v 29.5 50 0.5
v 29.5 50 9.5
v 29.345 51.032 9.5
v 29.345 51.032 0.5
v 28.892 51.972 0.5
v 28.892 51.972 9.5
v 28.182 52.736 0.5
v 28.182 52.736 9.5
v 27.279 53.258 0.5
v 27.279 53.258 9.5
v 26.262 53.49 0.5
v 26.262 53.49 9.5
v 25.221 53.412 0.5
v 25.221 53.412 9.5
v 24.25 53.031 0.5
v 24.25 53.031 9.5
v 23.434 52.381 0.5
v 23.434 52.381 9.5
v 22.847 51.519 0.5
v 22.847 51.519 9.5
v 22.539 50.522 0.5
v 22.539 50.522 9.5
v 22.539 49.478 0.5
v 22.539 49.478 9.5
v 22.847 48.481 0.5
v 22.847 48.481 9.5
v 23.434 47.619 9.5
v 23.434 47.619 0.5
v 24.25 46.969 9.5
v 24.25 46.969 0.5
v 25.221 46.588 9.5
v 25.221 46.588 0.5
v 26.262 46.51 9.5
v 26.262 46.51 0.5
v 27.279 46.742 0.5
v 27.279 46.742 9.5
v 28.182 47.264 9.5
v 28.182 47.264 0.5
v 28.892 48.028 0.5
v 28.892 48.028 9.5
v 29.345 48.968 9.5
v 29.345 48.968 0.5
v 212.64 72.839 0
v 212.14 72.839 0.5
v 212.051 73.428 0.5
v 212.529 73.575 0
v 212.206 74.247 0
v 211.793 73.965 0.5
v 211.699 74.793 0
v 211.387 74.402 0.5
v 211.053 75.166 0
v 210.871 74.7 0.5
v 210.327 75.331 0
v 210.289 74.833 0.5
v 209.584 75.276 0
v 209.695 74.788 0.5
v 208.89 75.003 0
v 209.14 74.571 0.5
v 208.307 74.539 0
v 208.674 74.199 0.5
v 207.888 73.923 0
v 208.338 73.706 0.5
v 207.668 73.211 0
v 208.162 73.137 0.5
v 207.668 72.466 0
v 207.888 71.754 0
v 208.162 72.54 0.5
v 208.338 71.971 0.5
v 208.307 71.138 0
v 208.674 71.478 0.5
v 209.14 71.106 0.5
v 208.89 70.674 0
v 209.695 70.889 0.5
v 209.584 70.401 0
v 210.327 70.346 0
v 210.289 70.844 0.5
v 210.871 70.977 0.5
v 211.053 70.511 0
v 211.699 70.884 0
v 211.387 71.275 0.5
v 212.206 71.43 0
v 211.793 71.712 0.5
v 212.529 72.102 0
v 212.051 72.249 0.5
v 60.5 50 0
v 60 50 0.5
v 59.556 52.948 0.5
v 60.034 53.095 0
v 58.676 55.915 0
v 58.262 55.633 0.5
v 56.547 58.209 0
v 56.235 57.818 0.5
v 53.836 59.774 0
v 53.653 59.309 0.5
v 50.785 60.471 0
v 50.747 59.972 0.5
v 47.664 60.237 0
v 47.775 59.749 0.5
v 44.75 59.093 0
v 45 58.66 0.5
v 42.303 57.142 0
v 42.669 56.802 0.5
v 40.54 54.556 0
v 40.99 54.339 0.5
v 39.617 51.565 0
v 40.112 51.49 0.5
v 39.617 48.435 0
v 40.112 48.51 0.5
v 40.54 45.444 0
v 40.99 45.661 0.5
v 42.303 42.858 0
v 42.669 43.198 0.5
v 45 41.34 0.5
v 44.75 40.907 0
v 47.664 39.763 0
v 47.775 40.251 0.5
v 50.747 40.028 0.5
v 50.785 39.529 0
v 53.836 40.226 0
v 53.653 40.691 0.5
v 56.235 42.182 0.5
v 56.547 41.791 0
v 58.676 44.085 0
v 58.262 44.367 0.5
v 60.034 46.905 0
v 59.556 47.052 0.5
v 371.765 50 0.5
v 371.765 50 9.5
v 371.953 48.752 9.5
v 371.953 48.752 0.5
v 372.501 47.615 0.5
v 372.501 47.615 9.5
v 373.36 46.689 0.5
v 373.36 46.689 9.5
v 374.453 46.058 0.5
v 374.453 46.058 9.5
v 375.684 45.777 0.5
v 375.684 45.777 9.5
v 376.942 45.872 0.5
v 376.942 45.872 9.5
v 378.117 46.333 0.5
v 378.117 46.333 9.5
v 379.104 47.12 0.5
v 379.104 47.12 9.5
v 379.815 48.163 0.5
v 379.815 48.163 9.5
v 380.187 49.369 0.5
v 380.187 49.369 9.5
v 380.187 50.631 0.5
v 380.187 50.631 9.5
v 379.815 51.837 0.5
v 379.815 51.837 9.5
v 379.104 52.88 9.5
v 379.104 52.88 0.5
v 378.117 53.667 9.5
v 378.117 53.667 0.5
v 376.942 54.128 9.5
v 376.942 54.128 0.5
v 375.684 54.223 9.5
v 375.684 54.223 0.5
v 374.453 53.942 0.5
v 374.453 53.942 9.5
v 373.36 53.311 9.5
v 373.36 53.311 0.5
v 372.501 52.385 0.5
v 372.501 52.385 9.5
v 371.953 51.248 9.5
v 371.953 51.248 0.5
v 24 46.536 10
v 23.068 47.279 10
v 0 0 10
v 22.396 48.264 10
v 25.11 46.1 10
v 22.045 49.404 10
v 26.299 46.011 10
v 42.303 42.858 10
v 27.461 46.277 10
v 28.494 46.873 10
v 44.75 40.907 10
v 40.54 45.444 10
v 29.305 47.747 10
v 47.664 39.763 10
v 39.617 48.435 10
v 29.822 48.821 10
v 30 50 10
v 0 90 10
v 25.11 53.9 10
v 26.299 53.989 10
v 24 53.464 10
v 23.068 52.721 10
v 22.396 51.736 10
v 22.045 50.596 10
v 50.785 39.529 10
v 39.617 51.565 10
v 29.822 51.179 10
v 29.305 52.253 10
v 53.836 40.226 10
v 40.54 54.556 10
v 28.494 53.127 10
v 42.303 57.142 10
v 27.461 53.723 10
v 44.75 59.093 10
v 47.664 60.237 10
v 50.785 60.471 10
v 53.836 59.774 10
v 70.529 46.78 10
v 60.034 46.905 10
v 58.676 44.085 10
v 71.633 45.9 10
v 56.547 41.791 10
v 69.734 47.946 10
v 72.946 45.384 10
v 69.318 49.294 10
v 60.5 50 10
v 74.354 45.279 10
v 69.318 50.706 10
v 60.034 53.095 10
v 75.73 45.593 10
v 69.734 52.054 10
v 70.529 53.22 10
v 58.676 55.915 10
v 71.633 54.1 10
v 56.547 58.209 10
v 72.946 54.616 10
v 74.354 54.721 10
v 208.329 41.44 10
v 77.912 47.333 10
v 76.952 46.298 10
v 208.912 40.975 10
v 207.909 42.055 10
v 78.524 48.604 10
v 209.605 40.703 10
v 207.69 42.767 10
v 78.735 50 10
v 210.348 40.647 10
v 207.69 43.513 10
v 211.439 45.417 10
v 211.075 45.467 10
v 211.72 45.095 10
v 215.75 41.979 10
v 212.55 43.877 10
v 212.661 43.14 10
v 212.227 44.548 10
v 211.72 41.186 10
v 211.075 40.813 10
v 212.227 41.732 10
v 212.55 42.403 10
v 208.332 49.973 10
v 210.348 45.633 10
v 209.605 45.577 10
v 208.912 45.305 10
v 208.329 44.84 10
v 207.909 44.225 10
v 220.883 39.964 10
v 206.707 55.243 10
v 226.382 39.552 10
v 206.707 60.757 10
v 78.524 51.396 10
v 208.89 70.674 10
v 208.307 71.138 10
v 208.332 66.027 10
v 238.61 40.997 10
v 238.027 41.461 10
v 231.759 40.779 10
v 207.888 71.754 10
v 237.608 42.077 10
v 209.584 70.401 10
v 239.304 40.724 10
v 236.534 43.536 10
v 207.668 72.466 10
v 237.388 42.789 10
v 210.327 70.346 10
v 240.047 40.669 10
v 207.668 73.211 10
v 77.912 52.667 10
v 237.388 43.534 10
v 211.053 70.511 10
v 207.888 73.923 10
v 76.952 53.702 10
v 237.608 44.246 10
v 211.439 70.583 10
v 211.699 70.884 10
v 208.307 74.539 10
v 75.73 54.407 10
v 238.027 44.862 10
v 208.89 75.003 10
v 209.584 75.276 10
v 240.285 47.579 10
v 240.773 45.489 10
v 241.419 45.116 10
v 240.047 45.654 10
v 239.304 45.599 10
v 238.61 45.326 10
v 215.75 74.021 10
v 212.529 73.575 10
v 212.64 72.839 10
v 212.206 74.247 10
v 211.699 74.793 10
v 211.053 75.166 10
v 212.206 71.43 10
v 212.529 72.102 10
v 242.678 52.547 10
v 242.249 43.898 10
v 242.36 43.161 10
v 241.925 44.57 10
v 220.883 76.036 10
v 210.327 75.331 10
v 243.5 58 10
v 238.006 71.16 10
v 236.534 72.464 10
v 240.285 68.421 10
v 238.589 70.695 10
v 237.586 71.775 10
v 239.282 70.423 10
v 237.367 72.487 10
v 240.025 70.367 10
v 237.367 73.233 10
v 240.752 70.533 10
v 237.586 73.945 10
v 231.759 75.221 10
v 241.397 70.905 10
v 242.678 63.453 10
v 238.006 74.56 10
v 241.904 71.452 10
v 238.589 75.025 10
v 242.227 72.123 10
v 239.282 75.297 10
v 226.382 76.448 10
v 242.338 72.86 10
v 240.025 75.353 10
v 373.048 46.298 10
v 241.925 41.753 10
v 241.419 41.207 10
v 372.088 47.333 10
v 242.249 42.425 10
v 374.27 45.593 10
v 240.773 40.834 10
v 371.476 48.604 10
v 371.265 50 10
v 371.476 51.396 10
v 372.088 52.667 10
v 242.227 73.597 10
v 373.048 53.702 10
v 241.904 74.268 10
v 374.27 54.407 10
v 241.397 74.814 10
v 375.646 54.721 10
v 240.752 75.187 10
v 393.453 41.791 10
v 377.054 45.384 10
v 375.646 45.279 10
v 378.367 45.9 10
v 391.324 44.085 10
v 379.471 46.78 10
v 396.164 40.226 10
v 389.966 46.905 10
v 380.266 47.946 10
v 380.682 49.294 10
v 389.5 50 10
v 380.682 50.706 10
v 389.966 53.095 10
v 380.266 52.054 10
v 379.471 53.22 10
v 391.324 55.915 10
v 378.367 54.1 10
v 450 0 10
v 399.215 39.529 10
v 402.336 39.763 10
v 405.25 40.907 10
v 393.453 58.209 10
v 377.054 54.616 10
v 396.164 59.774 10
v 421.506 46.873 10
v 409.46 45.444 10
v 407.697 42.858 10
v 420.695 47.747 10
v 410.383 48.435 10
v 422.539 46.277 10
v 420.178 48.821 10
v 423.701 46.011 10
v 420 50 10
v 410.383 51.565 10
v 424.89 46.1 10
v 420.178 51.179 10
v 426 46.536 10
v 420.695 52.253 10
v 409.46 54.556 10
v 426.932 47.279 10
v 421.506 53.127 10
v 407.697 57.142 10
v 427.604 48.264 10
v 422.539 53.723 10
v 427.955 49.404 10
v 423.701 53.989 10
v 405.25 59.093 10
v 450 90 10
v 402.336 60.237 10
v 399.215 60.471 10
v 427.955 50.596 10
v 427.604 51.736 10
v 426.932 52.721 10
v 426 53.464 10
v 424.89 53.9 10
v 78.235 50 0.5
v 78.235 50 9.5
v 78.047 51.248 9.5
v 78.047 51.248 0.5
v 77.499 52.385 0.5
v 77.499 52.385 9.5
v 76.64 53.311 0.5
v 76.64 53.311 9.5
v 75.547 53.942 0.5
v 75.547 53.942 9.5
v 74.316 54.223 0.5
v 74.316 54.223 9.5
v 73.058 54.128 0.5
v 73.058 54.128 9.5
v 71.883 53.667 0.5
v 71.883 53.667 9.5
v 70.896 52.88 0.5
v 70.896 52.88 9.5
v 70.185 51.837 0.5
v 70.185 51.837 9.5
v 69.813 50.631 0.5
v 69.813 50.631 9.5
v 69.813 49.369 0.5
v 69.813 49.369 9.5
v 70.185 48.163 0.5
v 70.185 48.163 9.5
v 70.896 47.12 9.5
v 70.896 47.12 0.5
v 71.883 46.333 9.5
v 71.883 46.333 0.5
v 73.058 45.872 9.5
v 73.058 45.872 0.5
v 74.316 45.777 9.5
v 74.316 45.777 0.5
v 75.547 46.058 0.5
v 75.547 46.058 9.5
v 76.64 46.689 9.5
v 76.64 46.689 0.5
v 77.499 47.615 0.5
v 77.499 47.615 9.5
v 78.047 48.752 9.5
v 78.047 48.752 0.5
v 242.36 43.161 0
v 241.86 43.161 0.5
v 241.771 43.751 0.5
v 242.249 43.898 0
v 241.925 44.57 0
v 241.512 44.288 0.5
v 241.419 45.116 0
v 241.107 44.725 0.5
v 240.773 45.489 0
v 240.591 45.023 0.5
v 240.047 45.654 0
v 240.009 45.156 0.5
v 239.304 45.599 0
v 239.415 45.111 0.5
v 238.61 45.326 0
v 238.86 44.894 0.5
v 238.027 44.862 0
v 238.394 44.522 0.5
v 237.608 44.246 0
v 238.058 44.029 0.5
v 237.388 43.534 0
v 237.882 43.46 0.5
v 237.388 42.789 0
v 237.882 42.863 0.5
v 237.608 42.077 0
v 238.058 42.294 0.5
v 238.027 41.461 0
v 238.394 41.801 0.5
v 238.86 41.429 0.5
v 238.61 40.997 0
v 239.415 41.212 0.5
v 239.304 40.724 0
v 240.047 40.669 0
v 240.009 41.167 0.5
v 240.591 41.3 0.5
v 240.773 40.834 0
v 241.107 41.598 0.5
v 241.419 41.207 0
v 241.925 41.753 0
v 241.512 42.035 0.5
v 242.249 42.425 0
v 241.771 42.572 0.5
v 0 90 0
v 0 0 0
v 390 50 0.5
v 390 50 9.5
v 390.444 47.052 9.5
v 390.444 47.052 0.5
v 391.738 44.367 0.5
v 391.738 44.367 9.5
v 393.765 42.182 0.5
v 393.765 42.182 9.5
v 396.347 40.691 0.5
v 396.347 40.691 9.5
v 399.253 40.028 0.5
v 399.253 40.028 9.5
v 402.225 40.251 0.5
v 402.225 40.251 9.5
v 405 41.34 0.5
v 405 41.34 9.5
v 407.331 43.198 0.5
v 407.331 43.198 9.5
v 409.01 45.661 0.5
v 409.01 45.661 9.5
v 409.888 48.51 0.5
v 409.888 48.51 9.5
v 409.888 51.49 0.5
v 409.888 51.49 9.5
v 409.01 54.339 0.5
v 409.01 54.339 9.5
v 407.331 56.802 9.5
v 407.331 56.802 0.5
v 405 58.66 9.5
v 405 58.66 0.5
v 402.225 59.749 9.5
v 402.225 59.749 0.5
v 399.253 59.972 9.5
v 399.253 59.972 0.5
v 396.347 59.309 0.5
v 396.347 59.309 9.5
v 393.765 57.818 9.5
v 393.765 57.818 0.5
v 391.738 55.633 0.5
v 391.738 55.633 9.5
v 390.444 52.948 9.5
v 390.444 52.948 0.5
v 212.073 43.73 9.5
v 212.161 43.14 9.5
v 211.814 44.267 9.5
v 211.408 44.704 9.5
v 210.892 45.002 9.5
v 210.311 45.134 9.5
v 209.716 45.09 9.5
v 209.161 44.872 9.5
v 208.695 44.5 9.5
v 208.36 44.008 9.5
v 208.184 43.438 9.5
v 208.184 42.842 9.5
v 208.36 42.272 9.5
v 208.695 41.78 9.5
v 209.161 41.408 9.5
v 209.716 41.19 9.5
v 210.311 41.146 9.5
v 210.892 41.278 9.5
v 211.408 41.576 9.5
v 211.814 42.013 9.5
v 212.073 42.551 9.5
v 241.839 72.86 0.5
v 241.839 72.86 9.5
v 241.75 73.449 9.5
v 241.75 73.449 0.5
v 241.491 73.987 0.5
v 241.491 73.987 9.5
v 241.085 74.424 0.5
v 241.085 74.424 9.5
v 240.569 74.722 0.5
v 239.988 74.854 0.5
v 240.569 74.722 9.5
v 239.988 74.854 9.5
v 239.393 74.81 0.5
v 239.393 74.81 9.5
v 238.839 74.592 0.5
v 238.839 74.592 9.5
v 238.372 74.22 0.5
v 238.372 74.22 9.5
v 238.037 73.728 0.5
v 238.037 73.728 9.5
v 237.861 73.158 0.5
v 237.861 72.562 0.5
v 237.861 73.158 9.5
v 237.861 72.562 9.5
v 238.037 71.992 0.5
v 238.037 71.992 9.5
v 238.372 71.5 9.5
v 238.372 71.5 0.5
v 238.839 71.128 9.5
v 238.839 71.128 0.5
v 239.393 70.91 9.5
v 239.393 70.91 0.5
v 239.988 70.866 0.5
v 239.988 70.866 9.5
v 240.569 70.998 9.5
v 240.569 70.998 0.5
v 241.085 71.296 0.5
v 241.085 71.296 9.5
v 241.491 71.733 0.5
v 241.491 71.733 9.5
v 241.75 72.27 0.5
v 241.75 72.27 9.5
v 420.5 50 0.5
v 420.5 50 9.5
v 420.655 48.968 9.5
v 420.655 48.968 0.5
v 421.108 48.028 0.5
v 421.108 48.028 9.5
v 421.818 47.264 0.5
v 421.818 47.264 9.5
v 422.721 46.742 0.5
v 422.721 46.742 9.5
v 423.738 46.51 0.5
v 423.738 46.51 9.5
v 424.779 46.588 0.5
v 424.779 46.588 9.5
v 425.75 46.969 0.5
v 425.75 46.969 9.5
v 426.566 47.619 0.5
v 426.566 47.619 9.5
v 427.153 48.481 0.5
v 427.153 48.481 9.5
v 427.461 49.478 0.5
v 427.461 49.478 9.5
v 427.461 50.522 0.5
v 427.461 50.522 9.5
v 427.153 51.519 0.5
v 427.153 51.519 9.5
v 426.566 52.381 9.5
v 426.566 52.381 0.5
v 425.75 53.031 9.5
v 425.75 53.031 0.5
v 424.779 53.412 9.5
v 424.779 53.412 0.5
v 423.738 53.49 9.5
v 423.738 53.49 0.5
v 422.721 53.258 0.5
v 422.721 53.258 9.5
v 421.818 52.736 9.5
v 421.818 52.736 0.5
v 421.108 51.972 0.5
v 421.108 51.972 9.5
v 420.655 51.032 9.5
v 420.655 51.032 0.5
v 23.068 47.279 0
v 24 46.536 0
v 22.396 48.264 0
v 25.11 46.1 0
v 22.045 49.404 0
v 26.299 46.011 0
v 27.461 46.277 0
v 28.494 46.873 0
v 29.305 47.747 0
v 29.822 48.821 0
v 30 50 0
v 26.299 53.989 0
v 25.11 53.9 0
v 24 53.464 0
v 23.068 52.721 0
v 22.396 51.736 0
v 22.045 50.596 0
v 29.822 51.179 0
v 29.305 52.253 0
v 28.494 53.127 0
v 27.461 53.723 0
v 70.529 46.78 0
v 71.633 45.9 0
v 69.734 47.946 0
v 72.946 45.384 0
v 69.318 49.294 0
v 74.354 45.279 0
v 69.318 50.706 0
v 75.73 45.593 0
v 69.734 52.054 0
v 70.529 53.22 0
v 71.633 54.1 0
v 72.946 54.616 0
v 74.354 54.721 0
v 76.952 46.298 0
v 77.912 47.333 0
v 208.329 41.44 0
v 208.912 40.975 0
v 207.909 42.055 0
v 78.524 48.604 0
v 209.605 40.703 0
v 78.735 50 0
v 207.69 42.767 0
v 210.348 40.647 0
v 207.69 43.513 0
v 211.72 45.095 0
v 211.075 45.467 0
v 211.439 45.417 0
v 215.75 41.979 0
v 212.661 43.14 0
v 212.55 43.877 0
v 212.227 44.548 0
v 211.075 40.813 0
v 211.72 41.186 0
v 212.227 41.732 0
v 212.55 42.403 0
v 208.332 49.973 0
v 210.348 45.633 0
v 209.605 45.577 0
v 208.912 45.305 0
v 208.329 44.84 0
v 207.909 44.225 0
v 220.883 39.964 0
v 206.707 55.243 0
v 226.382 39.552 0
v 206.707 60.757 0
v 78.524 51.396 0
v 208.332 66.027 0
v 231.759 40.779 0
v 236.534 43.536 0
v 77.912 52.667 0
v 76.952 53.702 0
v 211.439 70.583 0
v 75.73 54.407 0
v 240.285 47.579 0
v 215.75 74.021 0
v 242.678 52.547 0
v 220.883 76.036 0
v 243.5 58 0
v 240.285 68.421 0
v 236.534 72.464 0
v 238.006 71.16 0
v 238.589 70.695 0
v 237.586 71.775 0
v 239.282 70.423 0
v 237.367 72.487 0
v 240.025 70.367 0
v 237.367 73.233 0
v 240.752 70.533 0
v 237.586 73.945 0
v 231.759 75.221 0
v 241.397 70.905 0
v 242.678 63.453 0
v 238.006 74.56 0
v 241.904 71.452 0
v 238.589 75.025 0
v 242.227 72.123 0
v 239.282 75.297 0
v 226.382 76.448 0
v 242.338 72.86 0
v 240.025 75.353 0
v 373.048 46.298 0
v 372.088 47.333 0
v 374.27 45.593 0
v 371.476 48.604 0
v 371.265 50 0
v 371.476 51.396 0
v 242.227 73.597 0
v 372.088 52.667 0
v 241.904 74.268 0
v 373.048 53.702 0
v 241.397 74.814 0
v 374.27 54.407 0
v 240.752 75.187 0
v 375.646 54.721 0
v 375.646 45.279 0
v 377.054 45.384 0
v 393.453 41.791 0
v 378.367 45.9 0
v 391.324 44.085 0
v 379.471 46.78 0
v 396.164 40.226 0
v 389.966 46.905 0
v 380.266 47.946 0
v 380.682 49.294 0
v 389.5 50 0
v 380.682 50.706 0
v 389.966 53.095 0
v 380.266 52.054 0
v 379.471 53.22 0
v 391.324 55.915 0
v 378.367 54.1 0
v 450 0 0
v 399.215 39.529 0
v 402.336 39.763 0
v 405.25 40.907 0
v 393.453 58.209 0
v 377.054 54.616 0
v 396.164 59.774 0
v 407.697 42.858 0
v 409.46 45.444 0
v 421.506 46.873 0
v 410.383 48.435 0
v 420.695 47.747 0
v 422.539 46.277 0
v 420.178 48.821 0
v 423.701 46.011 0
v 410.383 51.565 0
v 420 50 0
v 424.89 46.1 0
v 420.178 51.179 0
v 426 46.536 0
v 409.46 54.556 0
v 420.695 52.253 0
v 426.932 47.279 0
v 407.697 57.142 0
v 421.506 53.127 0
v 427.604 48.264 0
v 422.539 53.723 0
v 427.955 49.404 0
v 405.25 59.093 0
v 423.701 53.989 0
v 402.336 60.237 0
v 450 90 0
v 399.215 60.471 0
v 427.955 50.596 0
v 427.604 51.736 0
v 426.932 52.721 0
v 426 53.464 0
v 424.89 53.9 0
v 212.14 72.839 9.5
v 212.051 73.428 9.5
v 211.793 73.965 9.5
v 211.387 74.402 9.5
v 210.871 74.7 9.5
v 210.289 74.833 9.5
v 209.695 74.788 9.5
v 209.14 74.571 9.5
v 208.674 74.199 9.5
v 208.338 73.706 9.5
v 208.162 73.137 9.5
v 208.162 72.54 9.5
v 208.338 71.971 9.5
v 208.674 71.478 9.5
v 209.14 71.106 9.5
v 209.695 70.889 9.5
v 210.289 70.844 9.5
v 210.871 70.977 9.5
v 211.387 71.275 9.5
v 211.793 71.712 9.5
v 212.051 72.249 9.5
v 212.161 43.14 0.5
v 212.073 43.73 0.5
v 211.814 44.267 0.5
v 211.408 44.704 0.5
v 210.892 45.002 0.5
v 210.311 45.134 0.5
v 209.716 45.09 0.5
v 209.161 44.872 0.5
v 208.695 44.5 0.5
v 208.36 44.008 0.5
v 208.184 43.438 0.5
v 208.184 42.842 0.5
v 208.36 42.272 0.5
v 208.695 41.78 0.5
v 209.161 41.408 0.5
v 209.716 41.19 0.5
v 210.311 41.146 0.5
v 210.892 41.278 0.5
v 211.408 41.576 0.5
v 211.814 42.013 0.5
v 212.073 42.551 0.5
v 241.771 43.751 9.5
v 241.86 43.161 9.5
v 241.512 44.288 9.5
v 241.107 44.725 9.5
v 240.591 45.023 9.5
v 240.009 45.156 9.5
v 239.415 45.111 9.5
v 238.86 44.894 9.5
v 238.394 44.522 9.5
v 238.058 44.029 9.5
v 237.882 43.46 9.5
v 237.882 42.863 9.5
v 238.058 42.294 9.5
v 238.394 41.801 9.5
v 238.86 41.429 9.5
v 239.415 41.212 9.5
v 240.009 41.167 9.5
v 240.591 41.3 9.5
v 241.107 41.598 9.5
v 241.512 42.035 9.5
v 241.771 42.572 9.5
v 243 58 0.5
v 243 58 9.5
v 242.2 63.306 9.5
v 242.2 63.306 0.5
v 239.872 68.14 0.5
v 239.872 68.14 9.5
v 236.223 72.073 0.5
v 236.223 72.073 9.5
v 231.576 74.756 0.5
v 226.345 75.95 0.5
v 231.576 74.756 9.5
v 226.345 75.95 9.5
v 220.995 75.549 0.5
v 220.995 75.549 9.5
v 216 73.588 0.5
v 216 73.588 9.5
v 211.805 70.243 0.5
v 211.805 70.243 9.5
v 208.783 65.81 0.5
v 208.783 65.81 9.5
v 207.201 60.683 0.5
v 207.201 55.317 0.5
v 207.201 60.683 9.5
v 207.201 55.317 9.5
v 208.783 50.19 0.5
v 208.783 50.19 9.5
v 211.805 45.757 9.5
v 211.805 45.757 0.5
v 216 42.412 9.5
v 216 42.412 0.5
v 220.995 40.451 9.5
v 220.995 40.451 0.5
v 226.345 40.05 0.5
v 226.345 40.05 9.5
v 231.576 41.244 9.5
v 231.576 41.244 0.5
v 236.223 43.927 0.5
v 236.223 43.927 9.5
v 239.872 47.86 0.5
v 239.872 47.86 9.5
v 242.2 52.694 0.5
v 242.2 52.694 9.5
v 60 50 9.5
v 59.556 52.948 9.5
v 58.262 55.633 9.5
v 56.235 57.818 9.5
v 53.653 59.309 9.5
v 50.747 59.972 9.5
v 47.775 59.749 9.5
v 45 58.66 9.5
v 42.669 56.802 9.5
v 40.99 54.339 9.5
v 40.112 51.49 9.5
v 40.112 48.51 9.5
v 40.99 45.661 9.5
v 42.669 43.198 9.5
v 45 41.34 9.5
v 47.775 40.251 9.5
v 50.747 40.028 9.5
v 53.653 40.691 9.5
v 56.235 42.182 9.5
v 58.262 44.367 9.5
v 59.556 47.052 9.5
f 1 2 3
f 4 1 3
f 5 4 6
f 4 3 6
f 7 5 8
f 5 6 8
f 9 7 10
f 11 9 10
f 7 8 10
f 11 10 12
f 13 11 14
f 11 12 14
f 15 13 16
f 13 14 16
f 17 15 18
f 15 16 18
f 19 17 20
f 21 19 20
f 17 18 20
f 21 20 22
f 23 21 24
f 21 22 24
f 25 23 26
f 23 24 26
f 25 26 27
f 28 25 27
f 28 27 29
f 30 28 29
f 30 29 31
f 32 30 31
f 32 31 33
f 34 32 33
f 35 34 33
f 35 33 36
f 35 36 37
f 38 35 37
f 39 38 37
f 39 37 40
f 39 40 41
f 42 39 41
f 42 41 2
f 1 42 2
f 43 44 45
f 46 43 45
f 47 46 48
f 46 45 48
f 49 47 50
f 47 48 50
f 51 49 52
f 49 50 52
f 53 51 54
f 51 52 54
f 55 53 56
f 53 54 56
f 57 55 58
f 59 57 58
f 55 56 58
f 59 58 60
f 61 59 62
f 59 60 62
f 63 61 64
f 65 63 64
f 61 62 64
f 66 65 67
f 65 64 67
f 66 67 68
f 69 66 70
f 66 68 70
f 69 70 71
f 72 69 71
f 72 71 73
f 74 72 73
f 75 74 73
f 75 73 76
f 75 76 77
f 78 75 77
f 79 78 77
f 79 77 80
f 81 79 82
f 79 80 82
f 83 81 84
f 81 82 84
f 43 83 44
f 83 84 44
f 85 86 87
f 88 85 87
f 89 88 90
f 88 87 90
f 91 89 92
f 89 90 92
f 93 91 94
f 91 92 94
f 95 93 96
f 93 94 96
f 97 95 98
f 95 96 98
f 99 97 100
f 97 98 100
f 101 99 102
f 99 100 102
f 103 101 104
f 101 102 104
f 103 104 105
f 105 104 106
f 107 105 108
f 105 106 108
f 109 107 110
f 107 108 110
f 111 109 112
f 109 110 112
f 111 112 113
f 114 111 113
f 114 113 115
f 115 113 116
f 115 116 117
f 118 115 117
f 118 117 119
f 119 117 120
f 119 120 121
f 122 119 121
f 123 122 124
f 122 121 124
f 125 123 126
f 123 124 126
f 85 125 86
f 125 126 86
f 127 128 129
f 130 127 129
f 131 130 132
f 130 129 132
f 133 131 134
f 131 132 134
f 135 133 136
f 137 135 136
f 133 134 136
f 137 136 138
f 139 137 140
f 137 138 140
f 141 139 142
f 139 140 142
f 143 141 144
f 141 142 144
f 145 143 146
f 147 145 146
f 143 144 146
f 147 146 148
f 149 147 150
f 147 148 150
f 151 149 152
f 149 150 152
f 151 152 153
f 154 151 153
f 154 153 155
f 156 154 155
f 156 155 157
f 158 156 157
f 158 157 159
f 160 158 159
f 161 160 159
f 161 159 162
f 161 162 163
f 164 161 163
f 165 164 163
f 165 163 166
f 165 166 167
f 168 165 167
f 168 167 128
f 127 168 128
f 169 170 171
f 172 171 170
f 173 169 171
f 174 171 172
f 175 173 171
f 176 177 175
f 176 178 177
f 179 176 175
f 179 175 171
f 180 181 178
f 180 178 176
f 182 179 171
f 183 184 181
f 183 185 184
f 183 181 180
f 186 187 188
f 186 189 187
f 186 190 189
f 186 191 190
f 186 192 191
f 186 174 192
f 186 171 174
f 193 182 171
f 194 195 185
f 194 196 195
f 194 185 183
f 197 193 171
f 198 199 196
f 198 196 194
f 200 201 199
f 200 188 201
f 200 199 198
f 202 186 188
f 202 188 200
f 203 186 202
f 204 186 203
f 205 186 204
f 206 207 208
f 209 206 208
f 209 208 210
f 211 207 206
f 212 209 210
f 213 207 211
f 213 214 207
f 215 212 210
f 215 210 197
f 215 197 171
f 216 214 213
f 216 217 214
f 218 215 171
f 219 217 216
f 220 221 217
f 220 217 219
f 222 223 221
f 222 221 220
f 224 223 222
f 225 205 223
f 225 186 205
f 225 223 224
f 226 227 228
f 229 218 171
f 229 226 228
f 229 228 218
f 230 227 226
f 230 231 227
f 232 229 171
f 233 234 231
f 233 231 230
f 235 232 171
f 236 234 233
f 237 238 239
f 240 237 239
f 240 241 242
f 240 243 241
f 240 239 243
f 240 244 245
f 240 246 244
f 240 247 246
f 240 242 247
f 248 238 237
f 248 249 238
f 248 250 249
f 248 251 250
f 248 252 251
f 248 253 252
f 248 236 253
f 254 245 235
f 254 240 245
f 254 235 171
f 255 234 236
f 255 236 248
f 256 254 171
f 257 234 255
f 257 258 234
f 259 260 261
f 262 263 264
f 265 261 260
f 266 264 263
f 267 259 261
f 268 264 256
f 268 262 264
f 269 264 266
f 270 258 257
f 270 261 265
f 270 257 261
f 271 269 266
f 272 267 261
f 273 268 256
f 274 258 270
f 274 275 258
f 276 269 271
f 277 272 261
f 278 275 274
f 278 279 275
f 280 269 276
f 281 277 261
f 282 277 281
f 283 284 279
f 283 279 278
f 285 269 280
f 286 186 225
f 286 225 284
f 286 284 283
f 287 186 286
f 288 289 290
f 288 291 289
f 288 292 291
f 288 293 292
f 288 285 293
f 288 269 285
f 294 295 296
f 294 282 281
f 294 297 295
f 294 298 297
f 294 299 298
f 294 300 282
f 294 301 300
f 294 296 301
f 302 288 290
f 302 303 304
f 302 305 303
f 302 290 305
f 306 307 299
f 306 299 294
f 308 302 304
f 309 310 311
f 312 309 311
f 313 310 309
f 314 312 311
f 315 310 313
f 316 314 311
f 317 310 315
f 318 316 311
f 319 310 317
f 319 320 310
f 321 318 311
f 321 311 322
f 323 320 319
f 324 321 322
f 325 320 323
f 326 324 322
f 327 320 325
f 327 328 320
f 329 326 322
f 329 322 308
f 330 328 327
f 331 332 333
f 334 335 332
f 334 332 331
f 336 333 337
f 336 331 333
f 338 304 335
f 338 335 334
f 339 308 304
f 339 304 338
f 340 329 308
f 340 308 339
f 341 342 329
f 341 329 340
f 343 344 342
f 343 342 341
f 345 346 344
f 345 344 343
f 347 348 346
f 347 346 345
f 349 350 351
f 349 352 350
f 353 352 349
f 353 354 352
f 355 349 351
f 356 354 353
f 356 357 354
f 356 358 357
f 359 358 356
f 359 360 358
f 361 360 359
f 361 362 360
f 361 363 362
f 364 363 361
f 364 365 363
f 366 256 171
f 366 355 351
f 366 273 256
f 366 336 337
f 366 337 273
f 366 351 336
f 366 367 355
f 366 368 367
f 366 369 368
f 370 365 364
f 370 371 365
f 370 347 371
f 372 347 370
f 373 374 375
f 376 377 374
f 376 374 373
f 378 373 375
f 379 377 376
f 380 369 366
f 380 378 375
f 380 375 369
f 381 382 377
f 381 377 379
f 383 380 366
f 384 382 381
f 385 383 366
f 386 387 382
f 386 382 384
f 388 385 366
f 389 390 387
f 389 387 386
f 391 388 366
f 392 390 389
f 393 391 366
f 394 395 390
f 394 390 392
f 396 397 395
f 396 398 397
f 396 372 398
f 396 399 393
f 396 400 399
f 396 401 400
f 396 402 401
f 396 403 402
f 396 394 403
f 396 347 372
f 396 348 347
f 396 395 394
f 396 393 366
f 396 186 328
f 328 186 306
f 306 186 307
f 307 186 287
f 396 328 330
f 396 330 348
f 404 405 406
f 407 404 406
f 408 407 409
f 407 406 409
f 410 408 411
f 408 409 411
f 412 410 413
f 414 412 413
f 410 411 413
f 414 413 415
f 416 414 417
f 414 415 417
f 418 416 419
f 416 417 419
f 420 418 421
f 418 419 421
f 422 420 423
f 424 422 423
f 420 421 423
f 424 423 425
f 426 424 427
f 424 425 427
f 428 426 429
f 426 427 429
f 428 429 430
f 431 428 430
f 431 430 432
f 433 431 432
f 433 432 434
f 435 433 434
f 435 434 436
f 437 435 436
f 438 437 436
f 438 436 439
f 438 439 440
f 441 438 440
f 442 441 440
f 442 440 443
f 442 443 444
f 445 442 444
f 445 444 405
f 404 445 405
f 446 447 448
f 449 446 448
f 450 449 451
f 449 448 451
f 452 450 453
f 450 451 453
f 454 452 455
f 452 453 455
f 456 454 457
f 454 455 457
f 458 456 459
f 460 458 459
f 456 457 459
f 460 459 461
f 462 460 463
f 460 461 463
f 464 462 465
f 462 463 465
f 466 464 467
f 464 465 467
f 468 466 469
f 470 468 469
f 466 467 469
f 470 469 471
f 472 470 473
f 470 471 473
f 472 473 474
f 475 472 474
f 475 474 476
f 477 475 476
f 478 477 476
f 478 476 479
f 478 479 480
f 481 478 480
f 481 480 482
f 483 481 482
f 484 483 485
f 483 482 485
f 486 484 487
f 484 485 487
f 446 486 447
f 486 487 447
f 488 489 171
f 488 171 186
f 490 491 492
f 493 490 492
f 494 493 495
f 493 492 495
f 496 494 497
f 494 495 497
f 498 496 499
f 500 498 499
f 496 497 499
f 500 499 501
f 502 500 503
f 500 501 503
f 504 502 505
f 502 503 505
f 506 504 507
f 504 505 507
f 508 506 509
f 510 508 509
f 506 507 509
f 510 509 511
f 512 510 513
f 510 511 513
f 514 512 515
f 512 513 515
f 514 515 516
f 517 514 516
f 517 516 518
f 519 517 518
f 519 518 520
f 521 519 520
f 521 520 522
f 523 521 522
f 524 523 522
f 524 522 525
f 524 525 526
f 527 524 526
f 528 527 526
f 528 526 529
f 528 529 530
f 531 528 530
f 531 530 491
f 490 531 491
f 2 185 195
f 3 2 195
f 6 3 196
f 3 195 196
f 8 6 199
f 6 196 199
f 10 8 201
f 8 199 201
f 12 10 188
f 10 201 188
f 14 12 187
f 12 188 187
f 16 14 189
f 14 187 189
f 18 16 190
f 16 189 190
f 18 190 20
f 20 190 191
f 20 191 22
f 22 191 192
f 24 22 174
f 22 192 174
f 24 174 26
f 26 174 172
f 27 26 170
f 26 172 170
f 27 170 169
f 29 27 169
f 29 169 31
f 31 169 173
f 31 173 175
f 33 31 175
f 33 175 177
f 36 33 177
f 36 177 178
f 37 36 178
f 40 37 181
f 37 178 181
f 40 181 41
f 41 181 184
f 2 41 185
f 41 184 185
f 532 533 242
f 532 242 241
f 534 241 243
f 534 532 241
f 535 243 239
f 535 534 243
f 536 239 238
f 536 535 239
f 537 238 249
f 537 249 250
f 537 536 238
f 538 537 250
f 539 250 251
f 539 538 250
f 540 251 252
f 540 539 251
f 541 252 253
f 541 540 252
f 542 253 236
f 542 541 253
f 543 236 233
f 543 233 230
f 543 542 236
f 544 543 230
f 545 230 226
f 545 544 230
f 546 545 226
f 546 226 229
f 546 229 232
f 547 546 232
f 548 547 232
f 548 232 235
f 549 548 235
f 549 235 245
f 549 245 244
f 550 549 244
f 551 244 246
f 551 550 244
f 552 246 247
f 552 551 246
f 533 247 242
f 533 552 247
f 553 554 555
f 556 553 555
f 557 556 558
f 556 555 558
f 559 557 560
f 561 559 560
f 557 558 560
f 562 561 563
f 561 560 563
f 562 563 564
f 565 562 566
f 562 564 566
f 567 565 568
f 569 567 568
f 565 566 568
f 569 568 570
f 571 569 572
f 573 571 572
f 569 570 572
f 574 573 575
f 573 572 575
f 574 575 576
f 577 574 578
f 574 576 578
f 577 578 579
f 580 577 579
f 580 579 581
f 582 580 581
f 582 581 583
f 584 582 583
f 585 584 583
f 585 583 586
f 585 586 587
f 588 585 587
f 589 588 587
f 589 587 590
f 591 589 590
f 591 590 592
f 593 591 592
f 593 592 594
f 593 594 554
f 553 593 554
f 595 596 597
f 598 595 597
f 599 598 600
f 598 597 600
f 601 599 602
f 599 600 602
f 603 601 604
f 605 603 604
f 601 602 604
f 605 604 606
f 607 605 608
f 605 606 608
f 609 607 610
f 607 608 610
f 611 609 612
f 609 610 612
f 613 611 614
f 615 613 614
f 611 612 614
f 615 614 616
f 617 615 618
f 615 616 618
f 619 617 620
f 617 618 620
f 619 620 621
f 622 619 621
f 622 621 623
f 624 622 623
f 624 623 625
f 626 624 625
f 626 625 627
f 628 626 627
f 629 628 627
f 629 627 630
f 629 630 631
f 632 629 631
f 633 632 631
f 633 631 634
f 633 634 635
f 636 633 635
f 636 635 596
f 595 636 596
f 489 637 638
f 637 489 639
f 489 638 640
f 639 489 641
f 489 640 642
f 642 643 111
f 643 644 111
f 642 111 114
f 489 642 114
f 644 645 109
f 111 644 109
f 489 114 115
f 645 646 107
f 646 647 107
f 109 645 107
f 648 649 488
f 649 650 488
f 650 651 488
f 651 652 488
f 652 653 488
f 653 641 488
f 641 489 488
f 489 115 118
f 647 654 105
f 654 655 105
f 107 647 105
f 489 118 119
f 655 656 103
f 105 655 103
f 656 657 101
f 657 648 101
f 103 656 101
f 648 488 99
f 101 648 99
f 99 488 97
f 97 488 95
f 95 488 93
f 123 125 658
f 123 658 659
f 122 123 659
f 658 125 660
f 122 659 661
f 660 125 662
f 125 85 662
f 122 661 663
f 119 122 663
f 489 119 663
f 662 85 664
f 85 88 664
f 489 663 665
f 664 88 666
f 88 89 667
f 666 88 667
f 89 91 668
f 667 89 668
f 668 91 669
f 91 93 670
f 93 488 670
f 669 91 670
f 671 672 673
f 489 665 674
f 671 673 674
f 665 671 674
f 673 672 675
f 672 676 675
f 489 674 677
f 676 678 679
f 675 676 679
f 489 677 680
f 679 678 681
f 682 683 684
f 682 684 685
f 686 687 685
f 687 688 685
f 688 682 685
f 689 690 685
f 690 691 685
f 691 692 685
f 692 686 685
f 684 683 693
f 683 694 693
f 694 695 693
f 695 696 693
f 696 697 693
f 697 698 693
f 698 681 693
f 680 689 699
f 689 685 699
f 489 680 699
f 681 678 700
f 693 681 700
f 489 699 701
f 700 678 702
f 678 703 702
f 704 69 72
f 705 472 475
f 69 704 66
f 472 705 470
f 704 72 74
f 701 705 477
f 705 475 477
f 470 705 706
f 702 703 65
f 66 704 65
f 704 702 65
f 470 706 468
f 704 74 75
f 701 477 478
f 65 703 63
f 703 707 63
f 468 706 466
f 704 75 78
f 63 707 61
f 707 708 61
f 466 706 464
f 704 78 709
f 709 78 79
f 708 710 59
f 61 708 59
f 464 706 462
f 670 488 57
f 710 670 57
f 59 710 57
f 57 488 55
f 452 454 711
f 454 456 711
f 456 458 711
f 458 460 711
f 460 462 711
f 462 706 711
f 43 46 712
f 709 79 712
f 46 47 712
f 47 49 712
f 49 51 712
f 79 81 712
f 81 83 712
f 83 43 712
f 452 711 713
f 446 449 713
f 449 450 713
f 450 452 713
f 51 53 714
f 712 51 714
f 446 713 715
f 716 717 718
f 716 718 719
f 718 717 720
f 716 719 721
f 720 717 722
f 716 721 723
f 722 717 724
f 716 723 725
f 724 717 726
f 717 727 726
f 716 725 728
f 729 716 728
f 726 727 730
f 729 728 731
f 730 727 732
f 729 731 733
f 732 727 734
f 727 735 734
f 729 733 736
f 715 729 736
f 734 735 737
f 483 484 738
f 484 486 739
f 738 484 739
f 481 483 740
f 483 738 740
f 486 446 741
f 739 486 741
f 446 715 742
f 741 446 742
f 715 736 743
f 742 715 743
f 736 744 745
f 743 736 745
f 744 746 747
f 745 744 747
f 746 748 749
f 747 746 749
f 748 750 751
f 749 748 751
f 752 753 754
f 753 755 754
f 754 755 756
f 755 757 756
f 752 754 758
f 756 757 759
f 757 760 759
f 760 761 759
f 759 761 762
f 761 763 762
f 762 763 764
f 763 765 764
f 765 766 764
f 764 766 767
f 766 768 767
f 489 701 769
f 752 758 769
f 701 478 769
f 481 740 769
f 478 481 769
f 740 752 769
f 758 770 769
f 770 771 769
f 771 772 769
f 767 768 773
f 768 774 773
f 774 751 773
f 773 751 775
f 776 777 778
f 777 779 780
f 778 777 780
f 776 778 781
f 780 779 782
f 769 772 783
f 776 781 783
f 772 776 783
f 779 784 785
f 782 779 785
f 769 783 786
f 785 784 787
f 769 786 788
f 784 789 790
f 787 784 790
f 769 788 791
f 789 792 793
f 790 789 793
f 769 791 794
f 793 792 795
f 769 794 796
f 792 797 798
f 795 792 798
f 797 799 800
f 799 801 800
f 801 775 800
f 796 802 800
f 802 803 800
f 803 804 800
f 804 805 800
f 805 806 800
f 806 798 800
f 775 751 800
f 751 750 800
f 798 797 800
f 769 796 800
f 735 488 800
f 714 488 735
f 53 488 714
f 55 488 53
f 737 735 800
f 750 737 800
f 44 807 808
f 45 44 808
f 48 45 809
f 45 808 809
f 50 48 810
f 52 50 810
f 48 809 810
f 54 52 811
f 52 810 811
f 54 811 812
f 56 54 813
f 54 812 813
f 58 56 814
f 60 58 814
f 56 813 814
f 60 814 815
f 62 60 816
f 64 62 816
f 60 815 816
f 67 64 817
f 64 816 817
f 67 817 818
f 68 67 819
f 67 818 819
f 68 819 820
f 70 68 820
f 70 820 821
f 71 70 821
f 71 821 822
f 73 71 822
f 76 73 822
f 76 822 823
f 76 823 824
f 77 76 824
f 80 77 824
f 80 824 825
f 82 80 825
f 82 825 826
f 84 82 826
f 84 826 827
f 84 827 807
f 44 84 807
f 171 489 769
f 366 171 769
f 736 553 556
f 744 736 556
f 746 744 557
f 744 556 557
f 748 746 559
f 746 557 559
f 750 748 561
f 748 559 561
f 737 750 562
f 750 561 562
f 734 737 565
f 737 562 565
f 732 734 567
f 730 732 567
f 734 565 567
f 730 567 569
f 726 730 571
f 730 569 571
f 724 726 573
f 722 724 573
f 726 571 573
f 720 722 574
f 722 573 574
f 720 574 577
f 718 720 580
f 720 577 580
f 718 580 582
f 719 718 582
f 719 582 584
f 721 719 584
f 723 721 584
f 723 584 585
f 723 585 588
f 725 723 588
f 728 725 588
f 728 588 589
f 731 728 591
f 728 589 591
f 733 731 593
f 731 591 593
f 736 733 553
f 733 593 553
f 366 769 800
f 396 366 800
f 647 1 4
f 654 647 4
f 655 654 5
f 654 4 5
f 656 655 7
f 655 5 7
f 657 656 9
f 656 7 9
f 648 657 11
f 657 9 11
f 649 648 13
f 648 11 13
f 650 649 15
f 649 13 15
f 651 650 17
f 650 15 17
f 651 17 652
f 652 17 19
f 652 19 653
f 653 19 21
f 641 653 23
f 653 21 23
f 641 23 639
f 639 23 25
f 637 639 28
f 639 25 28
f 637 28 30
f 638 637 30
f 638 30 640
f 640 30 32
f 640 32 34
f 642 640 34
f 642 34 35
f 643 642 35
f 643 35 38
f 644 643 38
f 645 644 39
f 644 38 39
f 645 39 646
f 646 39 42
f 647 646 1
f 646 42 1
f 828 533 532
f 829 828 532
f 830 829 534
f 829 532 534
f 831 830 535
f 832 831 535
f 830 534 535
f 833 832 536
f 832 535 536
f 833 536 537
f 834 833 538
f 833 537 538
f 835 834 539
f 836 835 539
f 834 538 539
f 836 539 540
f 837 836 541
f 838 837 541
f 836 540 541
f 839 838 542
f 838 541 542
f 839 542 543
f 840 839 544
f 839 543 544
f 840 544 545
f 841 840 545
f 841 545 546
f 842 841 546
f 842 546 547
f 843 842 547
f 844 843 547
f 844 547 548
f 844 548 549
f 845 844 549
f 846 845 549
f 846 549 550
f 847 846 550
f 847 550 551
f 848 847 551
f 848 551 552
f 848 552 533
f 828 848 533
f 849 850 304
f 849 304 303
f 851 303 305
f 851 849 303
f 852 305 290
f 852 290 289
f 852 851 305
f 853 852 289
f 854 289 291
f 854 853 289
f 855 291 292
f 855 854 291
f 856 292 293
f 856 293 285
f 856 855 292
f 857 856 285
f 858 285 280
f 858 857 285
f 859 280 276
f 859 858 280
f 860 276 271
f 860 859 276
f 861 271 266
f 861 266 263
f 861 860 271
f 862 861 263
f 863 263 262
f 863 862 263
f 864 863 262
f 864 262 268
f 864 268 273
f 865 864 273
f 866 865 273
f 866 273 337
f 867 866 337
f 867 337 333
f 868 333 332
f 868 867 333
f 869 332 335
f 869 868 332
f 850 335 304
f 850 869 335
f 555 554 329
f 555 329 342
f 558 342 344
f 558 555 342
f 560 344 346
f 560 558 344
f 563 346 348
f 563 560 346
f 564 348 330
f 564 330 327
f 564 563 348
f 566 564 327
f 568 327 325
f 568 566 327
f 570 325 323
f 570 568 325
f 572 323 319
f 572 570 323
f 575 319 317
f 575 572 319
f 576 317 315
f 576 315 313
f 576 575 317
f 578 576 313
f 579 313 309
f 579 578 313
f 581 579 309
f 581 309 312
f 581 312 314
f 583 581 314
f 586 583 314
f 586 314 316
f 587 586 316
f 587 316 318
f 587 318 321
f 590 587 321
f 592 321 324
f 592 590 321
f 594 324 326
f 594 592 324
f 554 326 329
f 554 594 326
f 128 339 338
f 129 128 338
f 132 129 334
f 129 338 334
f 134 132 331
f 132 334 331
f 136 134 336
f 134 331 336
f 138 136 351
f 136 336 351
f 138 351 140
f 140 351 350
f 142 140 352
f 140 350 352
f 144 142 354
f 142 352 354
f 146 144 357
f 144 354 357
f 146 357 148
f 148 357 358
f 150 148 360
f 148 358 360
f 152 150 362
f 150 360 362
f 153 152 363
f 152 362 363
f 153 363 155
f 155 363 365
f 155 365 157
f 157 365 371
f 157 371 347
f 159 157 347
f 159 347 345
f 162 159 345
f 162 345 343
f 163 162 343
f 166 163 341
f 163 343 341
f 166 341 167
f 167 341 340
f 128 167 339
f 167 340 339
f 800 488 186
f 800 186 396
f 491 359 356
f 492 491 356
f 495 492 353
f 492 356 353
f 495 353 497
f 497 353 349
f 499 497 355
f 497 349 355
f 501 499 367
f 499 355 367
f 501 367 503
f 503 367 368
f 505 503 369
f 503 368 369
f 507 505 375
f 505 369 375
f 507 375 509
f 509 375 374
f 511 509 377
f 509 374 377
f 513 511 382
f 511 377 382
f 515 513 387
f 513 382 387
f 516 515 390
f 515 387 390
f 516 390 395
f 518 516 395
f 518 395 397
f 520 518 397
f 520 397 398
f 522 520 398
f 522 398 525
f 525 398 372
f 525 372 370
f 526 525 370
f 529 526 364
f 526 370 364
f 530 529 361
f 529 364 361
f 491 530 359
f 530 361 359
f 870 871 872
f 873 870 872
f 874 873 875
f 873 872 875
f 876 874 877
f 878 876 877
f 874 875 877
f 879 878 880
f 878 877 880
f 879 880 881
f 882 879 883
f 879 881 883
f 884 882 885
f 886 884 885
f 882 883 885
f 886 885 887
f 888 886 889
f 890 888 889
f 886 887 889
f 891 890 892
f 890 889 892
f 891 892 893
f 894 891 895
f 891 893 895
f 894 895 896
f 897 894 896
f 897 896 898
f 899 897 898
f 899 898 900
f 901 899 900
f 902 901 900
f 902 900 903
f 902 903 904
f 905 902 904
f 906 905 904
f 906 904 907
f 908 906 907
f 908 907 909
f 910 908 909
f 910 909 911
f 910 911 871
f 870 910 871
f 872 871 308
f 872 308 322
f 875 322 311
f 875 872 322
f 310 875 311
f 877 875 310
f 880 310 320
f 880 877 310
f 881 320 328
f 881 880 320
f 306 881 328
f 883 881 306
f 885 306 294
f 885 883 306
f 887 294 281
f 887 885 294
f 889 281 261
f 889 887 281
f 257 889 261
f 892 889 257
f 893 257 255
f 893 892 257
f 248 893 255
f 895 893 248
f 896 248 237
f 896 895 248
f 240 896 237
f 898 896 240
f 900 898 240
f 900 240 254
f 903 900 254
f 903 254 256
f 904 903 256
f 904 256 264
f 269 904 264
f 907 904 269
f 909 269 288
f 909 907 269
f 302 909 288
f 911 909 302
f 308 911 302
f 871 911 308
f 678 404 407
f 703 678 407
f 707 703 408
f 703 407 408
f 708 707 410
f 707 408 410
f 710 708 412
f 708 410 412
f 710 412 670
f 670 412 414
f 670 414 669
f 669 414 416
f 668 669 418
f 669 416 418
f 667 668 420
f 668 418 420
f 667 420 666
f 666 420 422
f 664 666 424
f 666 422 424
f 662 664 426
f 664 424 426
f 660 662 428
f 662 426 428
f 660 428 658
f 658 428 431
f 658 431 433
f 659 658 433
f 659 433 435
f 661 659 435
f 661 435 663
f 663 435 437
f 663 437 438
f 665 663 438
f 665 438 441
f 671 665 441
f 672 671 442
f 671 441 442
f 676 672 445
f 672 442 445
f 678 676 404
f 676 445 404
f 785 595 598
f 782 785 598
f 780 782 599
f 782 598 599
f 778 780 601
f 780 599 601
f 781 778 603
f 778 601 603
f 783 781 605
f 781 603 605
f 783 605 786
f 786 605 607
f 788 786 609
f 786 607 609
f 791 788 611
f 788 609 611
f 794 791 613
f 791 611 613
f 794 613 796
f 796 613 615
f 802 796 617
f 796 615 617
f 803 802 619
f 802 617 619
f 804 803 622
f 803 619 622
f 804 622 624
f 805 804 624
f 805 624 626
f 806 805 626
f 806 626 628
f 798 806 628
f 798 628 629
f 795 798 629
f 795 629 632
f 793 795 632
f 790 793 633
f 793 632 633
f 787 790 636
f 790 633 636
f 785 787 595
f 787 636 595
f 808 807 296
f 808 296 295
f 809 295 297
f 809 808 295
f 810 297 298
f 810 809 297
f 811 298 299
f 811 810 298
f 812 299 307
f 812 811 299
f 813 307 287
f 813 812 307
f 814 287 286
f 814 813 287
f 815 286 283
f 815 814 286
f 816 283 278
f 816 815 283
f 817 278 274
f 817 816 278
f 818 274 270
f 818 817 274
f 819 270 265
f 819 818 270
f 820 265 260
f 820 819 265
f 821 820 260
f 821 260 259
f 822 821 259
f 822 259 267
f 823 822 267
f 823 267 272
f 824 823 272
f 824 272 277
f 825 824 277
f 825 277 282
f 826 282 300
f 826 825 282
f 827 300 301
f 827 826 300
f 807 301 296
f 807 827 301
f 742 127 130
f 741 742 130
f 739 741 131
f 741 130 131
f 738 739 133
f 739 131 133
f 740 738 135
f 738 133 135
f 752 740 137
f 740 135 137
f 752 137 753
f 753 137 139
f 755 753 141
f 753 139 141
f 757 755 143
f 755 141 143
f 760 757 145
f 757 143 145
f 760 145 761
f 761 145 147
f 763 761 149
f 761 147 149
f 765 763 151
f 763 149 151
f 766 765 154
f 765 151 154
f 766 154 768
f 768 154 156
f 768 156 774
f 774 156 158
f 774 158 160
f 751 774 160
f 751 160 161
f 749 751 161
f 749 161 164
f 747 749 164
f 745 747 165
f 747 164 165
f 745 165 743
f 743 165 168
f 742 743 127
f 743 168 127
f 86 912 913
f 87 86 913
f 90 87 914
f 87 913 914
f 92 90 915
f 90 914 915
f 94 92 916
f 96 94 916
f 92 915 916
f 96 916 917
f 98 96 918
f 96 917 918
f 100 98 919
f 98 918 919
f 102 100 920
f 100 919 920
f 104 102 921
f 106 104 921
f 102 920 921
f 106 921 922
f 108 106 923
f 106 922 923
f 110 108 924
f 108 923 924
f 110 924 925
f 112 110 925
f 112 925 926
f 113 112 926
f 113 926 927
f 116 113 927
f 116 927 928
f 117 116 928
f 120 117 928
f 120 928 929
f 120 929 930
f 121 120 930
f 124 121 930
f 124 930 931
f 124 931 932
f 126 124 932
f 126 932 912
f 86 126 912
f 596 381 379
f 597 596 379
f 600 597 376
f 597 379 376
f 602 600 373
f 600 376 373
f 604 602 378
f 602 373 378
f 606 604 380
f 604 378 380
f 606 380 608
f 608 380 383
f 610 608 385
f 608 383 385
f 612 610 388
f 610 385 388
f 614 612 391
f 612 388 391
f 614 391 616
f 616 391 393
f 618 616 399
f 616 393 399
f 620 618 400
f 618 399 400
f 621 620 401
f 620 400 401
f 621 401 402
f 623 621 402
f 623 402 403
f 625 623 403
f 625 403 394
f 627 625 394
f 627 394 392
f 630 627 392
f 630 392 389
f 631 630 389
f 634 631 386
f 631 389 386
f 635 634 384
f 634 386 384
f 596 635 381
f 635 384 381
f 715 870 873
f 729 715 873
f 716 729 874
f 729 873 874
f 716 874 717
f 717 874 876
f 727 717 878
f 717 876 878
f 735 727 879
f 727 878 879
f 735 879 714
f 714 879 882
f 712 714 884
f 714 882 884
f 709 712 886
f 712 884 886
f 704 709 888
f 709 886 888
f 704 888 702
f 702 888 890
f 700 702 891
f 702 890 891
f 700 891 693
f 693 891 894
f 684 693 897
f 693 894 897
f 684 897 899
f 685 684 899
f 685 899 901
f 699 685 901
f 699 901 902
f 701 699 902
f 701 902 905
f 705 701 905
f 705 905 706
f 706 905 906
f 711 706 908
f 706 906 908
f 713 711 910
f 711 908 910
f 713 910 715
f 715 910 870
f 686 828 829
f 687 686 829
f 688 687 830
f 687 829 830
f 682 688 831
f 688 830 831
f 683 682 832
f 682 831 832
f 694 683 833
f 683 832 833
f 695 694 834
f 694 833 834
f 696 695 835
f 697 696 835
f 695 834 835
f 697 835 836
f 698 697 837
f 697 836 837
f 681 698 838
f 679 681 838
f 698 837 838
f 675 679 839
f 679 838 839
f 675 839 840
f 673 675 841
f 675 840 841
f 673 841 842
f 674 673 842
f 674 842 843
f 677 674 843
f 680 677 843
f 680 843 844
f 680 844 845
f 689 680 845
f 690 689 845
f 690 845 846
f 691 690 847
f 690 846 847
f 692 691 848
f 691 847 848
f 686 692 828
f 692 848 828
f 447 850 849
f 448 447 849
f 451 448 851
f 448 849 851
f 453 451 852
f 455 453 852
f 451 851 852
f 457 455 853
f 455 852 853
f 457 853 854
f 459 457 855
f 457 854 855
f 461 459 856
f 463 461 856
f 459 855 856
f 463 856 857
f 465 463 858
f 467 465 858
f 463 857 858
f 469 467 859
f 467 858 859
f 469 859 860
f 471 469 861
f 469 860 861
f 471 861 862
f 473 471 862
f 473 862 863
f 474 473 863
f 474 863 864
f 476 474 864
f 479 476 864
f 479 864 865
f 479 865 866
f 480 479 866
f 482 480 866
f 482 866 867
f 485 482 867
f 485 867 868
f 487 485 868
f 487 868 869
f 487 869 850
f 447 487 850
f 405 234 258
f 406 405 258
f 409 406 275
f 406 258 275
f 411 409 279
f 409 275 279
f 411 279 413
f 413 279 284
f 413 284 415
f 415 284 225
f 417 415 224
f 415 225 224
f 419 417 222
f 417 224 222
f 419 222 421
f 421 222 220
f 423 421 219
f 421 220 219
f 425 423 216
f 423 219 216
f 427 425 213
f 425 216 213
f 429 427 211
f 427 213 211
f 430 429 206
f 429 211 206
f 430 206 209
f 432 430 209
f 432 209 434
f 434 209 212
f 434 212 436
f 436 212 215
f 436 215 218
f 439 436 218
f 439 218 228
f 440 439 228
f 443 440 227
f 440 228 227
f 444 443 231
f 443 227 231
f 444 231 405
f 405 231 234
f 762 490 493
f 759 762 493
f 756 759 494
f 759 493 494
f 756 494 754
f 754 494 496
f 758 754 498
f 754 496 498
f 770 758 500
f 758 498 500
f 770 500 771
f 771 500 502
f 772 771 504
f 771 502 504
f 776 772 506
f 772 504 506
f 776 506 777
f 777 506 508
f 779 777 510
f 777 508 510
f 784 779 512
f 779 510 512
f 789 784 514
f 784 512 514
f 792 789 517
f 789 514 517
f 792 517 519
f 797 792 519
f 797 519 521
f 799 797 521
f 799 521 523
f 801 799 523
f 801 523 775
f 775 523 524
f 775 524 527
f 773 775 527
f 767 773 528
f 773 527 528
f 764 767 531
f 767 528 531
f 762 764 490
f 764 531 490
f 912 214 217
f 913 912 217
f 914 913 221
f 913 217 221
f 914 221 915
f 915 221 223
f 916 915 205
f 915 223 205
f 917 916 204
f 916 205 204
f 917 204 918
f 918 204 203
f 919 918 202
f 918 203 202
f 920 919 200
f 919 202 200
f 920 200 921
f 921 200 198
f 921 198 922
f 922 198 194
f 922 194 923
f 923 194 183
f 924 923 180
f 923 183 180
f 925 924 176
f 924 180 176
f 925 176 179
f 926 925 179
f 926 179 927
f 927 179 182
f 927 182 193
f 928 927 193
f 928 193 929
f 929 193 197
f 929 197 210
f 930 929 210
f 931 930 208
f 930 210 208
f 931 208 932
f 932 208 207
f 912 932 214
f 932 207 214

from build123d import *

# Parameters (mm, degrees)
CROQUIS2_W              = 450
CROQUIS2_H              = 90
SALIENTE_EXTRUIR1_DEPTH = 10
CROQUIS6_R              = 18
CROQUIS6_R_2            = 2
CORTAR_EXTRUIR1_DEPTH   = 460.020696701
CHAFL_N5_SIZE           = 0.5
CROQUIS10_R             = 3.5
CROQUIS10_R_2           = 4.234641279
CROQUIS10_R_3           = 10
CORTAR_EXTRUIR3_DEPTH   = 460.020696701
CHAFL_N6_SIZE           = 0.5


with BuildPart() as part:
    # Croquis2 → Saliente-Extruir1 (new body)
    with BuildSketch(Plane.XY):
        with Locations((225, 45)):
            Rectangle(CROQUIS2_W, CROQUIS2_H)
    extrude(amount=SALIENTE_EXTRUIR1_DEPTH)

    # Croquis6 → Cortar-Extruir1 (cut, through all)
    with BuildSketch(Plane.XY.offset(10)):
        with Locations((225, 58)):
            Circle(CROQUIS6_R)
        with Locations((210.140026495, 72.838503544)):
            Circle(CROQUIS6_R_2)
        with Locations((239.838503544, 72.859973505)):
            Circle(CROQUIS6_R_2)
        with Locations((239.859973505, 43.161496456)):
            Circle(CROQUIS6_R_2)
        with Locations((210.161496456, 43.140026495)):
            Circle(CROQUIS6_R_2)
    extrude(amount=-CORTAR_EXTRUIR1_DEPTH, mode=Mode.SUBTRACT)

    # Chaflán5
    chafl_n5_edges = [part.edges().sort_by_distance(p)[0] for p in [
        (207, 58, 0),
        (207, 58, 10),
        (208.140026495, 72.838503544, 0),
        (208.140026495, 72.838503544, 10),
        (237.838503544, 72.859973505, 0),
        (237.838503544, 72.859973505, 10),
        (237.859973505, 43.161496456, 0),
        (237.859973505, 43.161496456, 10),
        (208.161496456, 43.140026495, 0),
        (208.161496456, 43.140026495, 10),
    ]]
    chamfer(chafl_n5_edges, length=CHAFL_N5_SIZE - 0.0001)  # a hair under: the kernel refuses the full size

    # Croquis10 → Cortar-Extruir3 (cut, through all)
    with BuildSketch(Plane.XY.offset(10)):
        with Locations((26, 50)):
            Circle(CROQUIS10_R)
        with Locations((74, 50)):
            Circle(CROQUIS10_R_2)
        with Locations(Location((376, 50, 0), (0, 0, 180))):
            Circle(CROQUIS10_R_2)
        with Locations(Location((400, 50, 0), (0, 0, 180))):
            Circle(CROQUIS10_R_3)
        with Locations((50, 50)):
            Circle(CROQUIS10_R_3)
        with Locations(Location((424, 50, 0), (0, 0, 180))):
            Circle(CROQUIS10_R)
    extrude(amount=-CORTAR_EXTRUIR3_DEPTH, mode=Mode.SUBTRACT)

    # Chaflán6
    chafl_n6_edges = [part.edges().sort_by_distance(p)[0] for p in [
        (427.5, 50, 0),
        (427.5, 50, 10),
        (22.5, 50, 0),
        (22.5, 50, 10),
        (69.765358721, 50, 0),
        (69.765358721, 50, 10),
        (380.234641279, 50, 0),
        (380.234641279, 50, 10),
        (410, 50, 0),
        (410, 50, 10),
        (40, 50, 0),
        (40, 50, 10),
    ]]
    chamfer(chafl_n6_edges, length=CHAFL_N6_SIZE)


solid = part.part
